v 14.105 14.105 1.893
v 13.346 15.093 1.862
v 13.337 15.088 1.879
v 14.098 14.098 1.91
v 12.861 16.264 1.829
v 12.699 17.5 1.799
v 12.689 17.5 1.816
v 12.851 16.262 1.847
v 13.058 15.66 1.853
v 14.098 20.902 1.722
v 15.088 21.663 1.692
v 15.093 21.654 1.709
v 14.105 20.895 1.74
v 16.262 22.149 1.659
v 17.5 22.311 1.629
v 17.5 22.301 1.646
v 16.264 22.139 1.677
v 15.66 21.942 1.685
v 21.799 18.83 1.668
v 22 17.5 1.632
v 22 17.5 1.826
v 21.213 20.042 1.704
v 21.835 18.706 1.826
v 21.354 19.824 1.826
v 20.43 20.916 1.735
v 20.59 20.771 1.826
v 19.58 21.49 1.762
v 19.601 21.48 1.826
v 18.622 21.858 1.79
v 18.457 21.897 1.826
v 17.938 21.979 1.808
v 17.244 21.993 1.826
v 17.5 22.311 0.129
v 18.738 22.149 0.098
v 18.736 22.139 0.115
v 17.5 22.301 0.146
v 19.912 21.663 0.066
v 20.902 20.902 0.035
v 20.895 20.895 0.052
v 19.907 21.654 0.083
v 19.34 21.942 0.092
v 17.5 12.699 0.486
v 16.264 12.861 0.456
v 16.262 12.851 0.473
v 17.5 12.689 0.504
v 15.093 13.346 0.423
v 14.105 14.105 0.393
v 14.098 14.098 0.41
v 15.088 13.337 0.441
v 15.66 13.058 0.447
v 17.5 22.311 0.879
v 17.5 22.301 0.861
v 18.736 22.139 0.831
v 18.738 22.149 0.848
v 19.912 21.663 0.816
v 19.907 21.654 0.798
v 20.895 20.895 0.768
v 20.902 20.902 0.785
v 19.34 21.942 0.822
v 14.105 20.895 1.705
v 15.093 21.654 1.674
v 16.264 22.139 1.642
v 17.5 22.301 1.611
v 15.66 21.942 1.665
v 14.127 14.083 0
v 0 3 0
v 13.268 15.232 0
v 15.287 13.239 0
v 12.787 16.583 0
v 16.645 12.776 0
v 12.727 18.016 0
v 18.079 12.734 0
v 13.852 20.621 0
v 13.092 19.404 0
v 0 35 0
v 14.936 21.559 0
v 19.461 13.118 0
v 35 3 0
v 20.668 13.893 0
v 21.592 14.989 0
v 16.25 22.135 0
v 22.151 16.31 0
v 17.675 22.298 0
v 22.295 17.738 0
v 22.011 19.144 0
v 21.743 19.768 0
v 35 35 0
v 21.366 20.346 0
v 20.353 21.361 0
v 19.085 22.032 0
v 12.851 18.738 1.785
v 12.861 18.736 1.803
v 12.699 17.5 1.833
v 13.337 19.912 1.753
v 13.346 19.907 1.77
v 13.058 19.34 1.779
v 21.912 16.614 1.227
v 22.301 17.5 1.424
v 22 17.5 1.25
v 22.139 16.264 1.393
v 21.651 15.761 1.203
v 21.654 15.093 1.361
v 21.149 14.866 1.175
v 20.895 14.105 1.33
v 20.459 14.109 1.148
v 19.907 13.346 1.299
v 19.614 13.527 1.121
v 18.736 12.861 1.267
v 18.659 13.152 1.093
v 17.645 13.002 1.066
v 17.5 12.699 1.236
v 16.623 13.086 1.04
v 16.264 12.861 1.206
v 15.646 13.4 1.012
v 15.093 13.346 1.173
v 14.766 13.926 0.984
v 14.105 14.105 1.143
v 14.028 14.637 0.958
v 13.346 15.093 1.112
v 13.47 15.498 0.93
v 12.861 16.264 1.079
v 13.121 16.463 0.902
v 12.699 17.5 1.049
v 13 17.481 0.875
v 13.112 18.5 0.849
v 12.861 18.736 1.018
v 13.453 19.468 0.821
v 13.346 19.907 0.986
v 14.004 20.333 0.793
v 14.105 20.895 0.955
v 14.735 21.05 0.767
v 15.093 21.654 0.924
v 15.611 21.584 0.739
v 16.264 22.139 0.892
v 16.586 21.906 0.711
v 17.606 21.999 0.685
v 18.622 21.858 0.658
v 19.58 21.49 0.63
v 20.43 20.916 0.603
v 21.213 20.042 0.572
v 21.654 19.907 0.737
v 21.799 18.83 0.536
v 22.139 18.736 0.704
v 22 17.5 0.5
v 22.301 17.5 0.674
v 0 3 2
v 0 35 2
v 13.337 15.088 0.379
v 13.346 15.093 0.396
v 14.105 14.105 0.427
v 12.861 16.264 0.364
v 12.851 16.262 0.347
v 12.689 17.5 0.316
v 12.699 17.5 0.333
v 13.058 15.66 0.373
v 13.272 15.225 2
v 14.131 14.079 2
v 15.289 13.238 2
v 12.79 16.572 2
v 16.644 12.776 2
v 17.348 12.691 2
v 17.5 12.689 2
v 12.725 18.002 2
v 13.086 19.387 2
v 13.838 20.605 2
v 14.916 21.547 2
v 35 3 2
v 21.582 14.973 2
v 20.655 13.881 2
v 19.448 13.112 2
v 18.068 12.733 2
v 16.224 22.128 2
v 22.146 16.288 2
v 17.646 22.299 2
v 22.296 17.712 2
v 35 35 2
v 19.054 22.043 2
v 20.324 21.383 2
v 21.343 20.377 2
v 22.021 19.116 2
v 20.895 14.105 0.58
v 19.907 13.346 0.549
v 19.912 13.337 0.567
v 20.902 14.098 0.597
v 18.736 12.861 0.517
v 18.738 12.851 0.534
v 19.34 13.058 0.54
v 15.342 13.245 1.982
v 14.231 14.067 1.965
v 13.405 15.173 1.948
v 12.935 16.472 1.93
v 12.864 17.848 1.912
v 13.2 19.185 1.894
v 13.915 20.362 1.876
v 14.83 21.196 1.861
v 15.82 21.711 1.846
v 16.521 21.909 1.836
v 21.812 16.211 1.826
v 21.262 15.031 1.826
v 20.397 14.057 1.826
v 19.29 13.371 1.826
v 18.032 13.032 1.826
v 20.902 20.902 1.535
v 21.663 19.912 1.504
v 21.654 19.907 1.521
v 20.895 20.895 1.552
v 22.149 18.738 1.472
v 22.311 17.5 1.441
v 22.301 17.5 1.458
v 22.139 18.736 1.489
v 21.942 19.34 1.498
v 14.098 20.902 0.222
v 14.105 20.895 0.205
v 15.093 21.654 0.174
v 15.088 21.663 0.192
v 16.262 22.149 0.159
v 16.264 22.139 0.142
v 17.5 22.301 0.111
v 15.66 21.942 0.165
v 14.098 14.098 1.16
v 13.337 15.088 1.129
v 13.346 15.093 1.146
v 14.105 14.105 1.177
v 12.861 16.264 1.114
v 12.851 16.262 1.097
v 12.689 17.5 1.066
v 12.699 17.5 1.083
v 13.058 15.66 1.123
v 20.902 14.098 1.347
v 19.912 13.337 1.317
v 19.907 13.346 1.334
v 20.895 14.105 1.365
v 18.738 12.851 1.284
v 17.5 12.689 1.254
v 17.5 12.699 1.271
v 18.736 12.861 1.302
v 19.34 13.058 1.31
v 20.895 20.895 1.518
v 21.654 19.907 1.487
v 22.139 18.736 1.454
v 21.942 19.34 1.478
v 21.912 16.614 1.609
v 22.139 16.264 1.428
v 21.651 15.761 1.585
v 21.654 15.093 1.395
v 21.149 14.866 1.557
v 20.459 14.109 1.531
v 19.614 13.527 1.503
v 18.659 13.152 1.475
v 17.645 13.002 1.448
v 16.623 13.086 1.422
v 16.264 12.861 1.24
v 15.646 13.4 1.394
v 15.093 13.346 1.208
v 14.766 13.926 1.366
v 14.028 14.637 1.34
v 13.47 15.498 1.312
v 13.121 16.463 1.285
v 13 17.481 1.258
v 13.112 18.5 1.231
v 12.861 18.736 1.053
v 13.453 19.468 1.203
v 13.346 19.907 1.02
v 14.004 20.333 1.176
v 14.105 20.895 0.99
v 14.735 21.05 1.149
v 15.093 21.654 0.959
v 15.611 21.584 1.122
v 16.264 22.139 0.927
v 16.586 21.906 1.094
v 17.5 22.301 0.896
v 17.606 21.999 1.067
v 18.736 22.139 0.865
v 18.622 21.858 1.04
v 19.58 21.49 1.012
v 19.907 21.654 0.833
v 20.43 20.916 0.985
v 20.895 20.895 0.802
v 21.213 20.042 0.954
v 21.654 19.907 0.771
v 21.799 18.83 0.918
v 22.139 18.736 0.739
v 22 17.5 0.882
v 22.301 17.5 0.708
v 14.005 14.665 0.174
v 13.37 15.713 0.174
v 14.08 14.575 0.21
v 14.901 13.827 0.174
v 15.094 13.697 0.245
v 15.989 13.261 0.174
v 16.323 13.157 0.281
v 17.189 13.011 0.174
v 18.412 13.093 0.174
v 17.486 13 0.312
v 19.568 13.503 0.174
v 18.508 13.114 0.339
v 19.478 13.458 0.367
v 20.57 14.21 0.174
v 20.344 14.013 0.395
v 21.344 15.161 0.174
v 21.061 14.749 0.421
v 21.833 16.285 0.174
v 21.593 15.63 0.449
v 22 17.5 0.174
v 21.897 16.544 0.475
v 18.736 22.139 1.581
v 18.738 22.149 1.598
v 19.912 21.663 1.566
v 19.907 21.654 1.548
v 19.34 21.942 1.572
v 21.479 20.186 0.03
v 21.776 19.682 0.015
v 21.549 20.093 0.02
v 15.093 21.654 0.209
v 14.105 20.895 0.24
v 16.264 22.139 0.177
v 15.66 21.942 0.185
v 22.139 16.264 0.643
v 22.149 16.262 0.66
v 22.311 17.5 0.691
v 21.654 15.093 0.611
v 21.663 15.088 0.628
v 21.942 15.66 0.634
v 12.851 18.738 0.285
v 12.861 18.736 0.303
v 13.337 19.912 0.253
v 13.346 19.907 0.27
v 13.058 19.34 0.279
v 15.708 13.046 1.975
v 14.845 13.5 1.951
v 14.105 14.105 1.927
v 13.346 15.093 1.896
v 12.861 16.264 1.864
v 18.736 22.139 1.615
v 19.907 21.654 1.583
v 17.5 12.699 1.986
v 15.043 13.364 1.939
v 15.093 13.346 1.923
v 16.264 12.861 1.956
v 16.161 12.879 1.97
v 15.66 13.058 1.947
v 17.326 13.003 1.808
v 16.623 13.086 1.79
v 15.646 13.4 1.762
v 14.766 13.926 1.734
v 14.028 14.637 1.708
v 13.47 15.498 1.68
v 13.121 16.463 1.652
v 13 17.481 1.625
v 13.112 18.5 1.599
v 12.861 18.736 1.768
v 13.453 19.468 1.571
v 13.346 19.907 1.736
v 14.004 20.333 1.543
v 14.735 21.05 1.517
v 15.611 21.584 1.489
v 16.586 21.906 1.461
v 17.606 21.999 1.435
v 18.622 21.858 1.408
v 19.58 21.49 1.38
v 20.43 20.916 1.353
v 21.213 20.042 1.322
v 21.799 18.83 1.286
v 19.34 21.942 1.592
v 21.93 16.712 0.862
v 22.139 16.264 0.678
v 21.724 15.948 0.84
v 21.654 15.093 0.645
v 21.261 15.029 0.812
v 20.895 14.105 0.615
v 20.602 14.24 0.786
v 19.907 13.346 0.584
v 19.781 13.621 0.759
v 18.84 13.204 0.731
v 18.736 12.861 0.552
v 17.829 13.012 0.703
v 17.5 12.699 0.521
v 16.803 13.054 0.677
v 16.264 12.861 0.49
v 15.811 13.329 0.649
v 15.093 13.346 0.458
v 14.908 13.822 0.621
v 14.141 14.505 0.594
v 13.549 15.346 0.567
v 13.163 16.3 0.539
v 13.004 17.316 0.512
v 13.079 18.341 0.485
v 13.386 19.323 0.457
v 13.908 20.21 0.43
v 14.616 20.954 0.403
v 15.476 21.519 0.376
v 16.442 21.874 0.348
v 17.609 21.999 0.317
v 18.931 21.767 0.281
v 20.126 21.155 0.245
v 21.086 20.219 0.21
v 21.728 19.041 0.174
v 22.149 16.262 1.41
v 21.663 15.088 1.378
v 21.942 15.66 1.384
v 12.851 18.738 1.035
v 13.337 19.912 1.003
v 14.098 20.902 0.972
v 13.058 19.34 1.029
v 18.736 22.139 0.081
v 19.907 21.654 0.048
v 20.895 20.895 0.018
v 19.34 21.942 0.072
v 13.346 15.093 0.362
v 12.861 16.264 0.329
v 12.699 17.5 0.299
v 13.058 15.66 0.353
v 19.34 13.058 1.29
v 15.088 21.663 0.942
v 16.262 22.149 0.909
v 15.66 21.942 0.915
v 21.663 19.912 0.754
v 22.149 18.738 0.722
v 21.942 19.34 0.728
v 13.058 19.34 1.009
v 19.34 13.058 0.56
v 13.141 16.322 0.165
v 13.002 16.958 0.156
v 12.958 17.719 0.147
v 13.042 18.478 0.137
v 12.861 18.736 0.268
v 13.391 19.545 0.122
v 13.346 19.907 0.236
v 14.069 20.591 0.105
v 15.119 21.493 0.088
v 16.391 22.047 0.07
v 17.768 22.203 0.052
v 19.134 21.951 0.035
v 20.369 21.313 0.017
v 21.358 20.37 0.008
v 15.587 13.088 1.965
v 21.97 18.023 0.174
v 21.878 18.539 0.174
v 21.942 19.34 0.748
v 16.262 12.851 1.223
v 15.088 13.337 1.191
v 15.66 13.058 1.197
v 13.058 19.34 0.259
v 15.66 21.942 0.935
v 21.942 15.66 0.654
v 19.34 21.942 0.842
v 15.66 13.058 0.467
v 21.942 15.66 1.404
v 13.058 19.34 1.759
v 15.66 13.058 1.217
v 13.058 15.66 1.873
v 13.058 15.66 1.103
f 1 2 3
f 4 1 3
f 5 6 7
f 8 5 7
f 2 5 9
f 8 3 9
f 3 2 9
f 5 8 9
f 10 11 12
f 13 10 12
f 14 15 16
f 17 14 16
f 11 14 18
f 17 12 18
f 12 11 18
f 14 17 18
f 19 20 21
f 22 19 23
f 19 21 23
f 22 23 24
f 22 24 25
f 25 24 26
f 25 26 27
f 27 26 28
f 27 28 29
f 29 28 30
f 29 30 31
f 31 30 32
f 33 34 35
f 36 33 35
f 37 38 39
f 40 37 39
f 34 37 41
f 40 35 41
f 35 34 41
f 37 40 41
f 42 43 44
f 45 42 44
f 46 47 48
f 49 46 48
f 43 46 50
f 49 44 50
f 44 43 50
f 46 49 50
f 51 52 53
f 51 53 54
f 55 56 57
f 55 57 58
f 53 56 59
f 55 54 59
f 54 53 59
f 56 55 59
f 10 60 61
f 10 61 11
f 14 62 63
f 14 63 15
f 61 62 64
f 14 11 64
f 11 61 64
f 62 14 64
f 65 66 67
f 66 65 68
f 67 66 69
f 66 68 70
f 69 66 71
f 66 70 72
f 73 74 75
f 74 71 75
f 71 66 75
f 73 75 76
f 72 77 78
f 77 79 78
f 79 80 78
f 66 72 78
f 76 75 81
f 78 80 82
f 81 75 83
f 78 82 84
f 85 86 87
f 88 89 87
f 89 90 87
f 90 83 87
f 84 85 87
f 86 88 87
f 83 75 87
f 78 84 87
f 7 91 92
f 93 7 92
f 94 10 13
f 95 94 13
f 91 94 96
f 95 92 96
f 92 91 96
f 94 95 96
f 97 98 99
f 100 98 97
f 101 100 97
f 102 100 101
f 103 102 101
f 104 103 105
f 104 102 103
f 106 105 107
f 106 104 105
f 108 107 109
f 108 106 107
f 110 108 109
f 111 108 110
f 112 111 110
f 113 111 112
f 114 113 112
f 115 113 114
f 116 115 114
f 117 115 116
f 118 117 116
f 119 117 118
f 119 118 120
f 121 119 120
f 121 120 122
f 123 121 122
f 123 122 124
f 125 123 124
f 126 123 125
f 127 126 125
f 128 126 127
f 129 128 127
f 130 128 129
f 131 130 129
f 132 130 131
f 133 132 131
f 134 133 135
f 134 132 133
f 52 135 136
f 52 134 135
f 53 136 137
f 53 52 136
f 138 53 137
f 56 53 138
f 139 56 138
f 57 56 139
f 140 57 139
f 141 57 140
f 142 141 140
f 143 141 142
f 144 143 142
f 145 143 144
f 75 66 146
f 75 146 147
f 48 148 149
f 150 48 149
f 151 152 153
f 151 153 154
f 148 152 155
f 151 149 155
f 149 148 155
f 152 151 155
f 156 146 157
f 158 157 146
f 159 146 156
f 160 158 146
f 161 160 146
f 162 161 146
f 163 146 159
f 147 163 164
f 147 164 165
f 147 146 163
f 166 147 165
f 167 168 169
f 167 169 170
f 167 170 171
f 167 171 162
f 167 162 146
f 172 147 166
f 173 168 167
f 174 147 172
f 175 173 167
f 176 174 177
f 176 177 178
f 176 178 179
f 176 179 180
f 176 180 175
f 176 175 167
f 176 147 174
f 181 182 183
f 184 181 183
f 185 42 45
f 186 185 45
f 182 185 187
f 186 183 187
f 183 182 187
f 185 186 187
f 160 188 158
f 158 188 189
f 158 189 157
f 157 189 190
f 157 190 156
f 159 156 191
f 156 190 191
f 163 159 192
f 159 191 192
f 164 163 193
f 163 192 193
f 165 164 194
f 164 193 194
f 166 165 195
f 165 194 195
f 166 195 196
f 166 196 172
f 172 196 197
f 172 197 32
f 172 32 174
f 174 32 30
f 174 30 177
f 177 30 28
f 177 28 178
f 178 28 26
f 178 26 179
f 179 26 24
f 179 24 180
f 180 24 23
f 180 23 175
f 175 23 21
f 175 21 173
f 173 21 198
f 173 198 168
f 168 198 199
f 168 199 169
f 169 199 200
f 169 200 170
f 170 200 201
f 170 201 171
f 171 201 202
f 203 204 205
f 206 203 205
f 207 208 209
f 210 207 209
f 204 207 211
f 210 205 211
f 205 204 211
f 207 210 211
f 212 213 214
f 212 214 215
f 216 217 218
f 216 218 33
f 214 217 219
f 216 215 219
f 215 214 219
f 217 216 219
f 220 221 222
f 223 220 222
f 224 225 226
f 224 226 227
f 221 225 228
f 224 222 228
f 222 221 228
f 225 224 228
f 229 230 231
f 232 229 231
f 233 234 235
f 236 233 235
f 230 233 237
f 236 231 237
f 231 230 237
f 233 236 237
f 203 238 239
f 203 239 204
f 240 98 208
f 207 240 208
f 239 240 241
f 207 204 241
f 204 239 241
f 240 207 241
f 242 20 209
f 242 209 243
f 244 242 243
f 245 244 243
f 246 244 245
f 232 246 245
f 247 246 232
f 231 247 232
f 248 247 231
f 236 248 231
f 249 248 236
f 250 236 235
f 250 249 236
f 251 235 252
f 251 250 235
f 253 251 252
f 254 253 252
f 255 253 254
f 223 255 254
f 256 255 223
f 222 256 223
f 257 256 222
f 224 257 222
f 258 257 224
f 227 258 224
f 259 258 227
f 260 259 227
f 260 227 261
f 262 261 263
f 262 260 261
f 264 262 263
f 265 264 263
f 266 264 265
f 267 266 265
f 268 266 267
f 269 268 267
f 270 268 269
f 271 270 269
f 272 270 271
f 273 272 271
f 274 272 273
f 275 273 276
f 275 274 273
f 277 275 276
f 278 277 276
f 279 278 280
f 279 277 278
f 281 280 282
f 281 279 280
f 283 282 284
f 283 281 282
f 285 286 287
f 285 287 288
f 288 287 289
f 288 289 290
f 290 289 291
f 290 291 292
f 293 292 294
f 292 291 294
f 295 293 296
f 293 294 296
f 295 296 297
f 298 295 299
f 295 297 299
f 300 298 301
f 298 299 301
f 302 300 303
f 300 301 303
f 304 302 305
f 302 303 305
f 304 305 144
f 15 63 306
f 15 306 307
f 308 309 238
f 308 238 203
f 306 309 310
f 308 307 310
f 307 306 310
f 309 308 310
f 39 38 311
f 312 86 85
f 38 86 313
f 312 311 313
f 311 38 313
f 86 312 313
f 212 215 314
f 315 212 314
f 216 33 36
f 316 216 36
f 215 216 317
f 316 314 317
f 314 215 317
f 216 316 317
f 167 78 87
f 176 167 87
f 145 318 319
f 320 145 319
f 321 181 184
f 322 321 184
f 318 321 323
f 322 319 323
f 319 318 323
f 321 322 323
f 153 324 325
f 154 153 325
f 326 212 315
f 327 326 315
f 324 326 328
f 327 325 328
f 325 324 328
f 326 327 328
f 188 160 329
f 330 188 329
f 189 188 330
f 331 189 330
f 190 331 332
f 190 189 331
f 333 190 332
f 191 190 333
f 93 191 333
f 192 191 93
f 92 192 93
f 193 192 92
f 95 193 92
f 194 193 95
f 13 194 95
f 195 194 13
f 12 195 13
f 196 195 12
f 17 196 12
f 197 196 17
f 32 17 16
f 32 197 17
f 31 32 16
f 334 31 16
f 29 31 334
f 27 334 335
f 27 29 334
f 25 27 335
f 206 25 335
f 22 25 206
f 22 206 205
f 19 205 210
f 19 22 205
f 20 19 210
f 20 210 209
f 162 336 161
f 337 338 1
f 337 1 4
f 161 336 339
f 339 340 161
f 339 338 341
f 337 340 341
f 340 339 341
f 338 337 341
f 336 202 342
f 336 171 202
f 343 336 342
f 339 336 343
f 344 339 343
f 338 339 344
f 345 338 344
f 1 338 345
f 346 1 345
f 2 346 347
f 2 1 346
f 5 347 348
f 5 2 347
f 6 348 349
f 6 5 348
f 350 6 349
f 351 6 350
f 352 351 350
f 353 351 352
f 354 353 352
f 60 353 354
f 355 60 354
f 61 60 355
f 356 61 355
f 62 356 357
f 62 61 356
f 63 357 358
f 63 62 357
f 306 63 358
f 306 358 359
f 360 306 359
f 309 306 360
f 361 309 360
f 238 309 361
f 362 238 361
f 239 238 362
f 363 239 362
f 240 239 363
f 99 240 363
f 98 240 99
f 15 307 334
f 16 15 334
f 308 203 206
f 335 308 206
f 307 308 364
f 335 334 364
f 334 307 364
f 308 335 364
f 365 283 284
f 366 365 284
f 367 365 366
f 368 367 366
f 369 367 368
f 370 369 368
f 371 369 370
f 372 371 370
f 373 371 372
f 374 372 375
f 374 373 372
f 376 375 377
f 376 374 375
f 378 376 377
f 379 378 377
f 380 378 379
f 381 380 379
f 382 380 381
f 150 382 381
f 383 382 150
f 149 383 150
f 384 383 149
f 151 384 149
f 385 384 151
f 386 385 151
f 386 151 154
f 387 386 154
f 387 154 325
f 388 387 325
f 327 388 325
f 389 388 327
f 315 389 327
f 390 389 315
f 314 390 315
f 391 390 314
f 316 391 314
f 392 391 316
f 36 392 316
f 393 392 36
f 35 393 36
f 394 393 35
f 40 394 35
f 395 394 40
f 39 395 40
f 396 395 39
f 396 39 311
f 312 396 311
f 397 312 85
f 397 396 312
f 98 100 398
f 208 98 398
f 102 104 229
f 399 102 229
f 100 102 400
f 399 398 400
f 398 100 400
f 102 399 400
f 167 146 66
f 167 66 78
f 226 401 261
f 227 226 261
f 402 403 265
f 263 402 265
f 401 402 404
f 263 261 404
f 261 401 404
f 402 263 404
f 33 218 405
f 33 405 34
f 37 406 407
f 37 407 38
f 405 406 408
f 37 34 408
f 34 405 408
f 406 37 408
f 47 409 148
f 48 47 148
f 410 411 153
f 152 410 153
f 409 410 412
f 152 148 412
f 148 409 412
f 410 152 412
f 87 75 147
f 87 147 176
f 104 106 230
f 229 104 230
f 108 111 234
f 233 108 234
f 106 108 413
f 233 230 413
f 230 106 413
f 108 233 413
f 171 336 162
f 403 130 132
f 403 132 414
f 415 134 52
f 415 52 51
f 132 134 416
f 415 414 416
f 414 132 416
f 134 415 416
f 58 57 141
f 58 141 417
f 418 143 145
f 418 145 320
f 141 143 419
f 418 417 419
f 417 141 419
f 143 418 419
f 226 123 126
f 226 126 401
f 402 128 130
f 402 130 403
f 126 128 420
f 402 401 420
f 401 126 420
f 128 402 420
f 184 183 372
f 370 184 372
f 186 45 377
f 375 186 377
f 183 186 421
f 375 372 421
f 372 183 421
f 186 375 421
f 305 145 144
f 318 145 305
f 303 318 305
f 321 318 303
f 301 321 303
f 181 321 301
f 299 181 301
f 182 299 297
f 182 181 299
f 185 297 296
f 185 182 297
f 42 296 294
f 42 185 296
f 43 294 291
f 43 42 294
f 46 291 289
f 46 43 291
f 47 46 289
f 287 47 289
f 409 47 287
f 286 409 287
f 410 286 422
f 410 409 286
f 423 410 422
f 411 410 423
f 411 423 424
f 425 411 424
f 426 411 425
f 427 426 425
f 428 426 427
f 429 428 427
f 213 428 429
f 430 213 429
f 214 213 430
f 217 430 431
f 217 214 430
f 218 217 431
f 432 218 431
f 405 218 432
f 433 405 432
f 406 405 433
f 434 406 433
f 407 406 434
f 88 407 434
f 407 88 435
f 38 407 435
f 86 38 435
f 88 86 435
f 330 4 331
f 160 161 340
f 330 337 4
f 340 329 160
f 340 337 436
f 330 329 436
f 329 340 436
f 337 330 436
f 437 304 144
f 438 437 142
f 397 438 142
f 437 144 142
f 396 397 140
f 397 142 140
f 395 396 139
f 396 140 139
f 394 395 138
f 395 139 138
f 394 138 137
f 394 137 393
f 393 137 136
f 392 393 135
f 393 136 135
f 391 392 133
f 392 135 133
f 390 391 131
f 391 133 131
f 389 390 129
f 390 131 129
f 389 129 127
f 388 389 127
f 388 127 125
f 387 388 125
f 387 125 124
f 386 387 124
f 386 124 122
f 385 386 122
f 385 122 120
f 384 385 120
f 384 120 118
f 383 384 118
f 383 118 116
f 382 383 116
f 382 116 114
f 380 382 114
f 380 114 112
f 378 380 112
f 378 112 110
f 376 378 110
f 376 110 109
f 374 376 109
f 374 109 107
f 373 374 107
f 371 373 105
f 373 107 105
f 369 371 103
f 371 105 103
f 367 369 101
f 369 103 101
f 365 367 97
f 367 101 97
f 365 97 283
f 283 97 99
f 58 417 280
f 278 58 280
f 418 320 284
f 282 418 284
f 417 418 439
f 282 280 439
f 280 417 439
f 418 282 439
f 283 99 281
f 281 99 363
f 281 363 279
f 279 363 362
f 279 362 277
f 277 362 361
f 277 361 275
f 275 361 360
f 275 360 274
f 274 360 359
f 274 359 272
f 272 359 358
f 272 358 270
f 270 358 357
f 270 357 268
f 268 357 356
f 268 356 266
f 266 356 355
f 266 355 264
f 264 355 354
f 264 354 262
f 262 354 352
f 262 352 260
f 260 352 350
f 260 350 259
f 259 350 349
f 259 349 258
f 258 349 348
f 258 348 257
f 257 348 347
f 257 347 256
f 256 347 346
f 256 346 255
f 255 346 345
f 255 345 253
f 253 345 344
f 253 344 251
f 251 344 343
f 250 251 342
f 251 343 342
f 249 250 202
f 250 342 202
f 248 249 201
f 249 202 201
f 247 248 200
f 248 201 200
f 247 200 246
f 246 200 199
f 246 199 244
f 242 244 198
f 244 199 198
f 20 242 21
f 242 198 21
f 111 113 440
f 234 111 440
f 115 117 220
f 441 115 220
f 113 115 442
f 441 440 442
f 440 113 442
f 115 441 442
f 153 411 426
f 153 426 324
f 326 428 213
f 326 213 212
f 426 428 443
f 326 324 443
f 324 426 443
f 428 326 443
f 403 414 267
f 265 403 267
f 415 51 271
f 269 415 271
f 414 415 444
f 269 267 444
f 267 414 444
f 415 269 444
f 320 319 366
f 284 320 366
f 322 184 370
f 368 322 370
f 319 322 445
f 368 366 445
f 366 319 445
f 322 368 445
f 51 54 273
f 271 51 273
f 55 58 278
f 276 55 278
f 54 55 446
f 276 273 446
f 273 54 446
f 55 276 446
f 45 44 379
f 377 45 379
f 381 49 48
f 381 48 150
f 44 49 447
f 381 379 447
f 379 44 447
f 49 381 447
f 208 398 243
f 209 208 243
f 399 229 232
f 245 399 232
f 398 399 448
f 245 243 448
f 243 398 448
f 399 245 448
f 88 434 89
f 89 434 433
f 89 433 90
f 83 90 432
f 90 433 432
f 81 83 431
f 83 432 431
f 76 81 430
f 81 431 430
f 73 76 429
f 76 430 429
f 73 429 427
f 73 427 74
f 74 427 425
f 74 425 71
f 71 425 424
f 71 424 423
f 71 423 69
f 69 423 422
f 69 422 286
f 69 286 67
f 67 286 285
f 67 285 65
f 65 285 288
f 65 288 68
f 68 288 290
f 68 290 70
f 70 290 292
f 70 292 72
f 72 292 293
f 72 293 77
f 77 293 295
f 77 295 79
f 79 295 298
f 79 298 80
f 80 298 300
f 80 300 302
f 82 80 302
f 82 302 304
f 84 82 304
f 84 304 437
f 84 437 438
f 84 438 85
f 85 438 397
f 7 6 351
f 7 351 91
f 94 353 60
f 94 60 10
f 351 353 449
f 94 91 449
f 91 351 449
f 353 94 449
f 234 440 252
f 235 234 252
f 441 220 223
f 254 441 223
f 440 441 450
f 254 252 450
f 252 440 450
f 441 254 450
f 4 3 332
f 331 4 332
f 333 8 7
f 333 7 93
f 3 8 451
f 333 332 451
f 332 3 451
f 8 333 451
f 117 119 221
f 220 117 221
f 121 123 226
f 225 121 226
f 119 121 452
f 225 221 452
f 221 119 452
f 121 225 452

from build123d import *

# Parameters (mm, degrees)
SKETCH1_W           = 35
SKETCH1_H           = 35
BOSS_EXTRUDE1_DEPTH = 2
CUT_EXTRUDE1_REACH  = 51.538
SKETCH2_R           = 4.5
CUT_SWEEP9_PITCH    = 0.75
SKETCH26_W          = 35
SKETCH26_H          = 2
CUT_EXTRUDE4_DEPTH  = 3


with BuildPart() as part:
    # Sketch1 → Boss-Extrude1 (new body)
    with BuildSketch(Plane.XY):
        with Locations((17.5, 17.5)):
            Rectangle(SKETCH1_W, SKETCH1_H)
    extrude(amount=BOSS_EXTRUDE1_DEPTH)

    # Sketch2 → Cut-Extrude1 (cut, up to next)
    with BuildSketch(Plane.XY.offset(2), mode=Mode.PRIVATE) as cut_extrude1_sk1:
        with Locations((17.5, 17.5)):
            Circle(SKETCH2_R)
    cut_extrude1_tool1 = extrude(cut_extrude1_sk1.sketch, amount=-CUT_EXTRUDE1_REACH, mode=Mode.PRIVATE) & part.part
    add(cut_extrude1_tool1.solids().sort_by_distance((17.5, 17.5, 2))[0], mode=Mode.SUBTRACT)

    # Cut-Sweep9: the profile of Sketch22 profile screwed along a right-hand helix of 3 turns, 8 arcs to a turn; built about Z, then put on its axis
    cut_sweep9_z = Axis((0, 0, 0), (0, 0, 1))
    cut_sweep9_corners = [(4.4997, 0, -0.382379083), (4.4997, 0, 0.000173205), (4.801, 0, -0.173782431), (4.811, 0, -0.191102939), (4.801, 0, -0.208423447)]
    with BuildLine(mode=Mode.PRIVATE) as cut_sweep9_profile:
        Line(cut_sweep9_corners[0], cut_sweep9_corners[1])
        Line(cut_sweep9_corners[1], cut_sweep9_corners[2])
        Line(cut_sweep9_corners[4], cut_sweep9_corners[0])
        ThreePointArc((4.801, 0, -0.173782431), (4.808320508, 0, -0.181102939), (4.811, 0, -0.191102939))
        ThreePointArc((4.811, 0, -0.191102939), (4.808320508, 0, -0.201102939), (4.801, 0, -0.208423447))
    cut_sweep9_cap = Face(cut_sweep9_profile.wire())
    cut_sweep9_arcs = [((4.801, 0, -0.173782431), (4.811, 0, -0.179555934), (4.811, 0, -0.191102939), (1, 0.8660254037844068, 1)), ((4.811, 0, -0.191102939), (4.811, 0, -0.202649944), (4.801, 0, -0.208423447), (1, 0.8660254037844068, 1))]  # start, shoulder, end, weights
    cut_sweep9_turn_angles = [0, 22.5, 45, 67.5, 90, 112.5, 135, 157.5, 180, 202.5, 225, 247.5, 270, 292.5, 315, 337.5, 360]
    cut_sweep9_turn_weights = [1, 0.9238795325112867, 1, 0.9238795325112867, 1, 0.9238795325112867, 1, 0.9238795325112867, 1, 0.9238795325112867, 1, 0.9238795325112867, 1, 0.9238795325112867, 1, 0.9238795325112867, 1]
    cut_sweep9_turn_rails = [Edge.make_bspline([Vector(p[0], p[1], 0).rotate(cut_sweep9_z, cut_sweep9_turn_angles[k]) / cut_sweep9_turn_weights[k] + Vector(0, 0, p[2] + CUT_SWEEP9_PITCH * cut_sweep9_turn_angles[k] / 360) for k in range(17)], [0, 0, 0, 1, 1, 2, 2, 3, 3, 4, 4, 5, 5, 6, 6, 7, 7, 8, 8, 8], 2, cut_sweep9_turn_weights) for p in cut_sweep9_corners]
    cut_sweep9_turn_sides = [*[Face.make_surface_from_curves(cut_sweep9_turn_rails[p[0]], cut_sweep9_turn_rails[p[1]]) for p in [(0, 1), (1, 2), (4, 0)]], *[Face.make_bezier_surface([[Vector(p[j][0], p[j][1], 0).rotate(cut_sweep9_z, cut_sweep9_turn_angles[2 * i + k]) / cut_sweep9_turn_weights[2 * i + k] + Vector(0, 0, p[j][2] + CUT_SWEEP9_PITCH * cut_sweep9_turn_angles[2 * i + k] / 360) for k in range(3)] for j in range(3)], [[p[3][j] * cut_sweep9_turn_weights[2 * i + k] for k in range(3)] for j in range(3)]) for p in cut_sweep9_arcs for i in range(8)]]
    cut_sweep9 = Plane(origin=(17.5, 17.5, 2), x_dir=(1, 0, 0), z_dir=(0, 0, -1)) * Solid(Shell([*[p.moved(Location((0, 0, CUT_SWEEP9_PITCH * i))) for i in range(3) for p in cut_sweep9_turn_sides], cut_sweep9_cap, cut_sweep9_cap.rotate(cut_sweep9_z, 1080).moved(Location((0, 0, CUT_SWEEP9_PITCH * 1080 / 360)))]))
    add(cut_sweep9, mode=Mode.SUBTRACT)

    # Cut-Extrude2 cone 1 section (through the dimple's axis) → Cut-Extrude2 (revolve, cut)
    with BuildSketch(Plane(origin=(17.5, 17.5, 2), x_dir=(0, -1, 0), z_dir=(1, 0, 0))):
        Polygon((0, 0), (4.801, 0), (0, 2.771858642), align=None)
    revolve(axis=Axis((17.5, 17.5, 2), (0, 0, -1)), mode=Mode.SUBTRACT)

    # Cut-Extrude3 cone 1 section (through the dimple's axis) → Cut-Extrude3 (revolve, cut)
    with BuildSketch(Plane(origin=(17.5, 17.5, 0), x_dir=(0, 1, 0), z_dir=(1, 0, 0))):
        Polygon((0, 0), (4.801, 0), (0, 2.771858642), align=None)
    revolve(axis=Axis((17.5, 17.5, 0), (0, 0, 1)), mode=Mode.SUBTRACT)

    # Sketch26 → Cut-Extrude4 (cut)
    with BuildSketch(Plane.XZ):
        with Locations((17.5, 1)):
            Rectangle(SKETCH26_W, SKETCH26_H)
    extrude(amount=-CUT_EXTRUDE4_DEPTH, mode=Mode.SUBTRACT)


solid = part.part
